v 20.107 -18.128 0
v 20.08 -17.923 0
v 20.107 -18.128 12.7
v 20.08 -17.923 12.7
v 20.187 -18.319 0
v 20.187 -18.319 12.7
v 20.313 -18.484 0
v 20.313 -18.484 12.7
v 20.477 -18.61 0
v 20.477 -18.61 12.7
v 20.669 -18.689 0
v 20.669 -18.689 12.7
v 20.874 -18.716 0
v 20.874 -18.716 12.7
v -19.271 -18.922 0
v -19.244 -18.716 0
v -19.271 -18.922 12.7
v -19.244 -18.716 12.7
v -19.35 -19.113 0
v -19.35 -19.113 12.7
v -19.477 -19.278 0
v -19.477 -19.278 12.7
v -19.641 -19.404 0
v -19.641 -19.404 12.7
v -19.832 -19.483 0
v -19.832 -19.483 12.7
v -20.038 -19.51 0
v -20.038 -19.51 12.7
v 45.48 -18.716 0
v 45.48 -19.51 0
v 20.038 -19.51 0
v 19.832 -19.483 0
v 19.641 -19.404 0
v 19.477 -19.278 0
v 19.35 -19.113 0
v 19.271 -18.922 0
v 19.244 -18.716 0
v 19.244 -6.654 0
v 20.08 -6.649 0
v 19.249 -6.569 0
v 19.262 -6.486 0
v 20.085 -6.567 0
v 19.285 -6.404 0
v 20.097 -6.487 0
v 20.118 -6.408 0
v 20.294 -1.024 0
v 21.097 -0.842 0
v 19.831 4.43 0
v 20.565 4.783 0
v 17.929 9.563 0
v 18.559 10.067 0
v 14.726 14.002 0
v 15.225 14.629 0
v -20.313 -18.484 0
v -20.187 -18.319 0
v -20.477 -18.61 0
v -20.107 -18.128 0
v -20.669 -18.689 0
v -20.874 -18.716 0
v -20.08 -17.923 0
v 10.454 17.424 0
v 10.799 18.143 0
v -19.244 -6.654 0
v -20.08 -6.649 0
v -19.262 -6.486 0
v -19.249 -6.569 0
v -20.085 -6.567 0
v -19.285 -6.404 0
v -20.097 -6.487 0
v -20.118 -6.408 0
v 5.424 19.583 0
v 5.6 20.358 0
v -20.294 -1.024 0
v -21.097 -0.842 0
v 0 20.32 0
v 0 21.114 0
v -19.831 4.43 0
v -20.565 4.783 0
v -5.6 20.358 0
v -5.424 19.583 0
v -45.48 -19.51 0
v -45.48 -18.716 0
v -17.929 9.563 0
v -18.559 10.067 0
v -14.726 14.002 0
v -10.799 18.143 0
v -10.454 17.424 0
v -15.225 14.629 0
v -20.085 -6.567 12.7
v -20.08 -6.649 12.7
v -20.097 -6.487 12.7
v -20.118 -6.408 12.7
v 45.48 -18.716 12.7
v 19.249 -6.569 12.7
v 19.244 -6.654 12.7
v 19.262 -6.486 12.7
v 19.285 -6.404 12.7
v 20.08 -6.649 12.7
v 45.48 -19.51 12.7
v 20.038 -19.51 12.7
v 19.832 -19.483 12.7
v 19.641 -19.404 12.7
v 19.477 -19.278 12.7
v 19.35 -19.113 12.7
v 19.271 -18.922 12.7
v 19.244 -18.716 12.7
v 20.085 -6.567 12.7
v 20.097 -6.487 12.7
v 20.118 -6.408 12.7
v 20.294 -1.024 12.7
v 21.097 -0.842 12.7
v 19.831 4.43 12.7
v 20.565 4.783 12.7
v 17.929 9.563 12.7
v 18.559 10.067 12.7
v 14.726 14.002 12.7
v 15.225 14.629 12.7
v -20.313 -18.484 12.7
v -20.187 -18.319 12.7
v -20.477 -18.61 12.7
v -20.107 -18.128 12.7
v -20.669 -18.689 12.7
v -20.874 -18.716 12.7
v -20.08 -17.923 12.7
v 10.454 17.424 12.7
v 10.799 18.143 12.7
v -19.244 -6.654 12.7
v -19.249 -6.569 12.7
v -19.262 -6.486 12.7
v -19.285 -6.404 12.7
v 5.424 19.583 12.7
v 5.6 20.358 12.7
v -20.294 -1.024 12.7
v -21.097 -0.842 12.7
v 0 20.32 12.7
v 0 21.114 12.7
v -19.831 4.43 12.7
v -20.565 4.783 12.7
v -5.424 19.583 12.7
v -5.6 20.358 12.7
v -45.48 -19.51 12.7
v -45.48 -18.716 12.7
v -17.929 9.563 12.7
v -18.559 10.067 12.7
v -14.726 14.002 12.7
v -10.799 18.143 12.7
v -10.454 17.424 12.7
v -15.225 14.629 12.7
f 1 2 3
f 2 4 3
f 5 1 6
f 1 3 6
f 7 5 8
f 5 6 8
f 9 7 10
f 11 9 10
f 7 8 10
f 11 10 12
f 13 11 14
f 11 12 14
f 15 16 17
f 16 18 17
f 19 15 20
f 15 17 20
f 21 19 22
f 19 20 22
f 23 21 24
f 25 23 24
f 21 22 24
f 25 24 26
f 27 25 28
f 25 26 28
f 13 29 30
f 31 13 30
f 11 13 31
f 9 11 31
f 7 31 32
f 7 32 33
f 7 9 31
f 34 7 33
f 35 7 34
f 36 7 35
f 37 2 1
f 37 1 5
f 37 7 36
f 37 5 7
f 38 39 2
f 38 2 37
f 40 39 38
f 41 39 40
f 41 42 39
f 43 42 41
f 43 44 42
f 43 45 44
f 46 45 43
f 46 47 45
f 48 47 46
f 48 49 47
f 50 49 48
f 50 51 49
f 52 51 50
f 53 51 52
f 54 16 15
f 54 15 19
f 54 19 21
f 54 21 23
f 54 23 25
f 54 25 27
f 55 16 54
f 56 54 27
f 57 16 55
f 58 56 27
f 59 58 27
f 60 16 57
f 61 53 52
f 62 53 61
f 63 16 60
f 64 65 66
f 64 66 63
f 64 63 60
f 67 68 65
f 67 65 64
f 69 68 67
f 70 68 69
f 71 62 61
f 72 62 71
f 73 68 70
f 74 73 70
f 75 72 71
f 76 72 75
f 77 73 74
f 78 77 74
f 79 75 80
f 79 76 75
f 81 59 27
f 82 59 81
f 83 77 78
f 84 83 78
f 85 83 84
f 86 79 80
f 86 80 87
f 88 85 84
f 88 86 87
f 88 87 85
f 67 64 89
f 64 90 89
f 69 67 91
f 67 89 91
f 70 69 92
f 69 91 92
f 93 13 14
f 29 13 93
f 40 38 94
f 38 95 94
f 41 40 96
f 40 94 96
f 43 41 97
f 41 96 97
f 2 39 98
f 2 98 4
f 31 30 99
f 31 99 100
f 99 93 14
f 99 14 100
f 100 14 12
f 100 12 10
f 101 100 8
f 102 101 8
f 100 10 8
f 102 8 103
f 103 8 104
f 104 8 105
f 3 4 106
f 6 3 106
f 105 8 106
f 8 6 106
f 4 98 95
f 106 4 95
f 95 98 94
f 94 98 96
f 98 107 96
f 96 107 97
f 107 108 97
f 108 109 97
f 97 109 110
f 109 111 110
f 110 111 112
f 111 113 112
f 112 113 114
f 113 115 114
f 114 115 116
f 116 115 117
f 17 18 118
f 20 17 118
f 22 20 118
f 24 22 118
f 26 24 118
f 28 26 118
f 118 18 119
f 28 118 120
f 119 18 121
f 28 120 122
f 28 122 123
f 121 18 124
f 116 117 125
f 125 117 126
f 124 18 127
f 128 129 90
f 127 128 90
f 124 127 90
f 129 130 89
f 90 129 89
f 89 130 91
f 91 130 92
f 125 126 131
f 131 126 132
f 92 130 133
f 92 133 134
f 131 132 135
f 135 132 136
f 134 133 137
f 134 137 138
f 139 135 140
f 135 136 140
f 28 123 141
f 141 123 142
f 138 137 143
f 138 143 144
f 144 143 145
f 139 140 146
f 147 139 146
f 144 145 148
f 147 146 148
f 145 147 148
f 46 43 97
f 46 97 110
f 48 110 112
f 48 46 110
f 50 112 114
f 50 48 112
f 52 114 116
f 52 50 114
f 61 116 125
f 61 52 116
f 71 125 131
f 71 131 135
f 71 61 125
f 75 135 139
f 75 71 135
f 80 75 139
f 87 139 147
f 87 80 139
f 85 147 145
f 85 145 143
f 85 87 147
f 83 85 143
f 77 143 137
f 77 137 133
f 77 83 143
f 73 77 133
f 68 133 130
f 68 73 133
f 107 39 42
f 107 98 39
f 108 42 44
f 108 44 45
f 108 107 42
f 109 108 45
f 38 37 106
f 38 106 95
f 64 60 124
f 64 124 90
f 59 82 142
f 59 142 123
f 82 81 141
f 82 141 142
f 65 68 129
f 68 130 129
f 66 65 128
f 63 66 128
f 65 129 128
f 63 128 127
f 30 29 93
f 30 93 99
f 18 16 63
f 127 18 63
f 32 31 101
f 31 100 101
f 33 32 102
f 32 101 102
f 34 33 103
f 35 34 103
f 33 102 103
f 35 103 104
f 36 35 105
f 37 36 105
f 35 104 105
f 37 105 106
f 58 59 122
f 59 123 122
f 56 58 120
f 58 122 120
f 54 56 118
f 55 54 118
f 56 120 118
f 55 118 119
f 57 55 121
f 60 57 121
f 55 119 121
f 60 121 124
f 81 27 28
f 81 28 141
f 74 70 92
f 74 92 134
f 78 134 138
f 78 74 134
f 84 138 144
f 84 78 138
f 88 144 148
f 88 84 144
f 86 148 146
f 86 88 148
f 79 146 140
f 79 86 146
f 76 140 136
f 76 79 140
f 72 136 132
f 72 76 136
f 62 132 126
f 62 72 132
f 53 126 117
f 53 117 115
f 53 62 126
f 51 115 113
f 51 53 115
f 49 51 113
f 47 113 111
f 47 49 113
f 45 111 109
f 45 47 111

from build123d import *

# Parameters (mm, degrees)
BOSS_EXTRUDE2_DEPTH = 12.7
FILLET2_R           = 0.79375


with BuildPart() as part:
    # Sketch1 → Boss-Extrude2 (new body)
    with BuildSketch(Plane.XY):
        with BuildLine():
            Line((20.080431402, -6.524317111), (20.080431402, -18.716317111))
            Line((20.080431402, -18.716317111), (45.480431402, -18.716317111))
            Line((45.480431402, -18.716317111), (45.480431402, -19.510067111))
            Line((45.480431402, -19.510067111), (19.244107832, -19.510067111))
            Line((19.244107832, -19.510067111), (19.244107832, -18.721996551))
            Line((19.244107832, -18.721996551), (19.244107832, -6.524317111))
            ThreePointArc((19.244107832, -6.524317111), (0, 20.32), (-19.244107832, -6.524317111))
            Line((-19.244107832, -6.524317111), (-20.080431402, -6.524317111))
            ThreePointArc((-20.080431402, -6.524317111), (0, 21.11375), (20.080431402, -6.524317111))
        make_face()
        Polygon((-19.244107832, -6.524317111), (-19.244107832, -18.721996551), (-19.244107832, -19.510067111), (-45.480431402, -19.510067111), (-45.480431402, -18.716317111), (-20.080431402, -18.716317111), (-20.080431402, -6.524317111), align=None)
    extrude(amount=BOSS_EXTRUDE2_DEPTH)

    # Fillet2
    fillet2_edges = [part.edges().sort_by_distance(p)[0] for p in [
        (20.080431402, -18.716317111, 6.35),
        (19.244107832, -19.510067111, 6.35),
        (19.244107832, -6.524317111, 6.35),
        (-19.244107832, -6.524317111, 6.35),
        (-19.244107832, -19.510067111, 6.35),
        (-20.080431402, -18.716317111, 6.35),
        (-20.080431402, -6.524317111, 6.35),
        (20.080431402, -6.524317111, 6.35),
    ]]
    fillet(fillet2_edges, radius=FILLET2_R)


solid = part.part
